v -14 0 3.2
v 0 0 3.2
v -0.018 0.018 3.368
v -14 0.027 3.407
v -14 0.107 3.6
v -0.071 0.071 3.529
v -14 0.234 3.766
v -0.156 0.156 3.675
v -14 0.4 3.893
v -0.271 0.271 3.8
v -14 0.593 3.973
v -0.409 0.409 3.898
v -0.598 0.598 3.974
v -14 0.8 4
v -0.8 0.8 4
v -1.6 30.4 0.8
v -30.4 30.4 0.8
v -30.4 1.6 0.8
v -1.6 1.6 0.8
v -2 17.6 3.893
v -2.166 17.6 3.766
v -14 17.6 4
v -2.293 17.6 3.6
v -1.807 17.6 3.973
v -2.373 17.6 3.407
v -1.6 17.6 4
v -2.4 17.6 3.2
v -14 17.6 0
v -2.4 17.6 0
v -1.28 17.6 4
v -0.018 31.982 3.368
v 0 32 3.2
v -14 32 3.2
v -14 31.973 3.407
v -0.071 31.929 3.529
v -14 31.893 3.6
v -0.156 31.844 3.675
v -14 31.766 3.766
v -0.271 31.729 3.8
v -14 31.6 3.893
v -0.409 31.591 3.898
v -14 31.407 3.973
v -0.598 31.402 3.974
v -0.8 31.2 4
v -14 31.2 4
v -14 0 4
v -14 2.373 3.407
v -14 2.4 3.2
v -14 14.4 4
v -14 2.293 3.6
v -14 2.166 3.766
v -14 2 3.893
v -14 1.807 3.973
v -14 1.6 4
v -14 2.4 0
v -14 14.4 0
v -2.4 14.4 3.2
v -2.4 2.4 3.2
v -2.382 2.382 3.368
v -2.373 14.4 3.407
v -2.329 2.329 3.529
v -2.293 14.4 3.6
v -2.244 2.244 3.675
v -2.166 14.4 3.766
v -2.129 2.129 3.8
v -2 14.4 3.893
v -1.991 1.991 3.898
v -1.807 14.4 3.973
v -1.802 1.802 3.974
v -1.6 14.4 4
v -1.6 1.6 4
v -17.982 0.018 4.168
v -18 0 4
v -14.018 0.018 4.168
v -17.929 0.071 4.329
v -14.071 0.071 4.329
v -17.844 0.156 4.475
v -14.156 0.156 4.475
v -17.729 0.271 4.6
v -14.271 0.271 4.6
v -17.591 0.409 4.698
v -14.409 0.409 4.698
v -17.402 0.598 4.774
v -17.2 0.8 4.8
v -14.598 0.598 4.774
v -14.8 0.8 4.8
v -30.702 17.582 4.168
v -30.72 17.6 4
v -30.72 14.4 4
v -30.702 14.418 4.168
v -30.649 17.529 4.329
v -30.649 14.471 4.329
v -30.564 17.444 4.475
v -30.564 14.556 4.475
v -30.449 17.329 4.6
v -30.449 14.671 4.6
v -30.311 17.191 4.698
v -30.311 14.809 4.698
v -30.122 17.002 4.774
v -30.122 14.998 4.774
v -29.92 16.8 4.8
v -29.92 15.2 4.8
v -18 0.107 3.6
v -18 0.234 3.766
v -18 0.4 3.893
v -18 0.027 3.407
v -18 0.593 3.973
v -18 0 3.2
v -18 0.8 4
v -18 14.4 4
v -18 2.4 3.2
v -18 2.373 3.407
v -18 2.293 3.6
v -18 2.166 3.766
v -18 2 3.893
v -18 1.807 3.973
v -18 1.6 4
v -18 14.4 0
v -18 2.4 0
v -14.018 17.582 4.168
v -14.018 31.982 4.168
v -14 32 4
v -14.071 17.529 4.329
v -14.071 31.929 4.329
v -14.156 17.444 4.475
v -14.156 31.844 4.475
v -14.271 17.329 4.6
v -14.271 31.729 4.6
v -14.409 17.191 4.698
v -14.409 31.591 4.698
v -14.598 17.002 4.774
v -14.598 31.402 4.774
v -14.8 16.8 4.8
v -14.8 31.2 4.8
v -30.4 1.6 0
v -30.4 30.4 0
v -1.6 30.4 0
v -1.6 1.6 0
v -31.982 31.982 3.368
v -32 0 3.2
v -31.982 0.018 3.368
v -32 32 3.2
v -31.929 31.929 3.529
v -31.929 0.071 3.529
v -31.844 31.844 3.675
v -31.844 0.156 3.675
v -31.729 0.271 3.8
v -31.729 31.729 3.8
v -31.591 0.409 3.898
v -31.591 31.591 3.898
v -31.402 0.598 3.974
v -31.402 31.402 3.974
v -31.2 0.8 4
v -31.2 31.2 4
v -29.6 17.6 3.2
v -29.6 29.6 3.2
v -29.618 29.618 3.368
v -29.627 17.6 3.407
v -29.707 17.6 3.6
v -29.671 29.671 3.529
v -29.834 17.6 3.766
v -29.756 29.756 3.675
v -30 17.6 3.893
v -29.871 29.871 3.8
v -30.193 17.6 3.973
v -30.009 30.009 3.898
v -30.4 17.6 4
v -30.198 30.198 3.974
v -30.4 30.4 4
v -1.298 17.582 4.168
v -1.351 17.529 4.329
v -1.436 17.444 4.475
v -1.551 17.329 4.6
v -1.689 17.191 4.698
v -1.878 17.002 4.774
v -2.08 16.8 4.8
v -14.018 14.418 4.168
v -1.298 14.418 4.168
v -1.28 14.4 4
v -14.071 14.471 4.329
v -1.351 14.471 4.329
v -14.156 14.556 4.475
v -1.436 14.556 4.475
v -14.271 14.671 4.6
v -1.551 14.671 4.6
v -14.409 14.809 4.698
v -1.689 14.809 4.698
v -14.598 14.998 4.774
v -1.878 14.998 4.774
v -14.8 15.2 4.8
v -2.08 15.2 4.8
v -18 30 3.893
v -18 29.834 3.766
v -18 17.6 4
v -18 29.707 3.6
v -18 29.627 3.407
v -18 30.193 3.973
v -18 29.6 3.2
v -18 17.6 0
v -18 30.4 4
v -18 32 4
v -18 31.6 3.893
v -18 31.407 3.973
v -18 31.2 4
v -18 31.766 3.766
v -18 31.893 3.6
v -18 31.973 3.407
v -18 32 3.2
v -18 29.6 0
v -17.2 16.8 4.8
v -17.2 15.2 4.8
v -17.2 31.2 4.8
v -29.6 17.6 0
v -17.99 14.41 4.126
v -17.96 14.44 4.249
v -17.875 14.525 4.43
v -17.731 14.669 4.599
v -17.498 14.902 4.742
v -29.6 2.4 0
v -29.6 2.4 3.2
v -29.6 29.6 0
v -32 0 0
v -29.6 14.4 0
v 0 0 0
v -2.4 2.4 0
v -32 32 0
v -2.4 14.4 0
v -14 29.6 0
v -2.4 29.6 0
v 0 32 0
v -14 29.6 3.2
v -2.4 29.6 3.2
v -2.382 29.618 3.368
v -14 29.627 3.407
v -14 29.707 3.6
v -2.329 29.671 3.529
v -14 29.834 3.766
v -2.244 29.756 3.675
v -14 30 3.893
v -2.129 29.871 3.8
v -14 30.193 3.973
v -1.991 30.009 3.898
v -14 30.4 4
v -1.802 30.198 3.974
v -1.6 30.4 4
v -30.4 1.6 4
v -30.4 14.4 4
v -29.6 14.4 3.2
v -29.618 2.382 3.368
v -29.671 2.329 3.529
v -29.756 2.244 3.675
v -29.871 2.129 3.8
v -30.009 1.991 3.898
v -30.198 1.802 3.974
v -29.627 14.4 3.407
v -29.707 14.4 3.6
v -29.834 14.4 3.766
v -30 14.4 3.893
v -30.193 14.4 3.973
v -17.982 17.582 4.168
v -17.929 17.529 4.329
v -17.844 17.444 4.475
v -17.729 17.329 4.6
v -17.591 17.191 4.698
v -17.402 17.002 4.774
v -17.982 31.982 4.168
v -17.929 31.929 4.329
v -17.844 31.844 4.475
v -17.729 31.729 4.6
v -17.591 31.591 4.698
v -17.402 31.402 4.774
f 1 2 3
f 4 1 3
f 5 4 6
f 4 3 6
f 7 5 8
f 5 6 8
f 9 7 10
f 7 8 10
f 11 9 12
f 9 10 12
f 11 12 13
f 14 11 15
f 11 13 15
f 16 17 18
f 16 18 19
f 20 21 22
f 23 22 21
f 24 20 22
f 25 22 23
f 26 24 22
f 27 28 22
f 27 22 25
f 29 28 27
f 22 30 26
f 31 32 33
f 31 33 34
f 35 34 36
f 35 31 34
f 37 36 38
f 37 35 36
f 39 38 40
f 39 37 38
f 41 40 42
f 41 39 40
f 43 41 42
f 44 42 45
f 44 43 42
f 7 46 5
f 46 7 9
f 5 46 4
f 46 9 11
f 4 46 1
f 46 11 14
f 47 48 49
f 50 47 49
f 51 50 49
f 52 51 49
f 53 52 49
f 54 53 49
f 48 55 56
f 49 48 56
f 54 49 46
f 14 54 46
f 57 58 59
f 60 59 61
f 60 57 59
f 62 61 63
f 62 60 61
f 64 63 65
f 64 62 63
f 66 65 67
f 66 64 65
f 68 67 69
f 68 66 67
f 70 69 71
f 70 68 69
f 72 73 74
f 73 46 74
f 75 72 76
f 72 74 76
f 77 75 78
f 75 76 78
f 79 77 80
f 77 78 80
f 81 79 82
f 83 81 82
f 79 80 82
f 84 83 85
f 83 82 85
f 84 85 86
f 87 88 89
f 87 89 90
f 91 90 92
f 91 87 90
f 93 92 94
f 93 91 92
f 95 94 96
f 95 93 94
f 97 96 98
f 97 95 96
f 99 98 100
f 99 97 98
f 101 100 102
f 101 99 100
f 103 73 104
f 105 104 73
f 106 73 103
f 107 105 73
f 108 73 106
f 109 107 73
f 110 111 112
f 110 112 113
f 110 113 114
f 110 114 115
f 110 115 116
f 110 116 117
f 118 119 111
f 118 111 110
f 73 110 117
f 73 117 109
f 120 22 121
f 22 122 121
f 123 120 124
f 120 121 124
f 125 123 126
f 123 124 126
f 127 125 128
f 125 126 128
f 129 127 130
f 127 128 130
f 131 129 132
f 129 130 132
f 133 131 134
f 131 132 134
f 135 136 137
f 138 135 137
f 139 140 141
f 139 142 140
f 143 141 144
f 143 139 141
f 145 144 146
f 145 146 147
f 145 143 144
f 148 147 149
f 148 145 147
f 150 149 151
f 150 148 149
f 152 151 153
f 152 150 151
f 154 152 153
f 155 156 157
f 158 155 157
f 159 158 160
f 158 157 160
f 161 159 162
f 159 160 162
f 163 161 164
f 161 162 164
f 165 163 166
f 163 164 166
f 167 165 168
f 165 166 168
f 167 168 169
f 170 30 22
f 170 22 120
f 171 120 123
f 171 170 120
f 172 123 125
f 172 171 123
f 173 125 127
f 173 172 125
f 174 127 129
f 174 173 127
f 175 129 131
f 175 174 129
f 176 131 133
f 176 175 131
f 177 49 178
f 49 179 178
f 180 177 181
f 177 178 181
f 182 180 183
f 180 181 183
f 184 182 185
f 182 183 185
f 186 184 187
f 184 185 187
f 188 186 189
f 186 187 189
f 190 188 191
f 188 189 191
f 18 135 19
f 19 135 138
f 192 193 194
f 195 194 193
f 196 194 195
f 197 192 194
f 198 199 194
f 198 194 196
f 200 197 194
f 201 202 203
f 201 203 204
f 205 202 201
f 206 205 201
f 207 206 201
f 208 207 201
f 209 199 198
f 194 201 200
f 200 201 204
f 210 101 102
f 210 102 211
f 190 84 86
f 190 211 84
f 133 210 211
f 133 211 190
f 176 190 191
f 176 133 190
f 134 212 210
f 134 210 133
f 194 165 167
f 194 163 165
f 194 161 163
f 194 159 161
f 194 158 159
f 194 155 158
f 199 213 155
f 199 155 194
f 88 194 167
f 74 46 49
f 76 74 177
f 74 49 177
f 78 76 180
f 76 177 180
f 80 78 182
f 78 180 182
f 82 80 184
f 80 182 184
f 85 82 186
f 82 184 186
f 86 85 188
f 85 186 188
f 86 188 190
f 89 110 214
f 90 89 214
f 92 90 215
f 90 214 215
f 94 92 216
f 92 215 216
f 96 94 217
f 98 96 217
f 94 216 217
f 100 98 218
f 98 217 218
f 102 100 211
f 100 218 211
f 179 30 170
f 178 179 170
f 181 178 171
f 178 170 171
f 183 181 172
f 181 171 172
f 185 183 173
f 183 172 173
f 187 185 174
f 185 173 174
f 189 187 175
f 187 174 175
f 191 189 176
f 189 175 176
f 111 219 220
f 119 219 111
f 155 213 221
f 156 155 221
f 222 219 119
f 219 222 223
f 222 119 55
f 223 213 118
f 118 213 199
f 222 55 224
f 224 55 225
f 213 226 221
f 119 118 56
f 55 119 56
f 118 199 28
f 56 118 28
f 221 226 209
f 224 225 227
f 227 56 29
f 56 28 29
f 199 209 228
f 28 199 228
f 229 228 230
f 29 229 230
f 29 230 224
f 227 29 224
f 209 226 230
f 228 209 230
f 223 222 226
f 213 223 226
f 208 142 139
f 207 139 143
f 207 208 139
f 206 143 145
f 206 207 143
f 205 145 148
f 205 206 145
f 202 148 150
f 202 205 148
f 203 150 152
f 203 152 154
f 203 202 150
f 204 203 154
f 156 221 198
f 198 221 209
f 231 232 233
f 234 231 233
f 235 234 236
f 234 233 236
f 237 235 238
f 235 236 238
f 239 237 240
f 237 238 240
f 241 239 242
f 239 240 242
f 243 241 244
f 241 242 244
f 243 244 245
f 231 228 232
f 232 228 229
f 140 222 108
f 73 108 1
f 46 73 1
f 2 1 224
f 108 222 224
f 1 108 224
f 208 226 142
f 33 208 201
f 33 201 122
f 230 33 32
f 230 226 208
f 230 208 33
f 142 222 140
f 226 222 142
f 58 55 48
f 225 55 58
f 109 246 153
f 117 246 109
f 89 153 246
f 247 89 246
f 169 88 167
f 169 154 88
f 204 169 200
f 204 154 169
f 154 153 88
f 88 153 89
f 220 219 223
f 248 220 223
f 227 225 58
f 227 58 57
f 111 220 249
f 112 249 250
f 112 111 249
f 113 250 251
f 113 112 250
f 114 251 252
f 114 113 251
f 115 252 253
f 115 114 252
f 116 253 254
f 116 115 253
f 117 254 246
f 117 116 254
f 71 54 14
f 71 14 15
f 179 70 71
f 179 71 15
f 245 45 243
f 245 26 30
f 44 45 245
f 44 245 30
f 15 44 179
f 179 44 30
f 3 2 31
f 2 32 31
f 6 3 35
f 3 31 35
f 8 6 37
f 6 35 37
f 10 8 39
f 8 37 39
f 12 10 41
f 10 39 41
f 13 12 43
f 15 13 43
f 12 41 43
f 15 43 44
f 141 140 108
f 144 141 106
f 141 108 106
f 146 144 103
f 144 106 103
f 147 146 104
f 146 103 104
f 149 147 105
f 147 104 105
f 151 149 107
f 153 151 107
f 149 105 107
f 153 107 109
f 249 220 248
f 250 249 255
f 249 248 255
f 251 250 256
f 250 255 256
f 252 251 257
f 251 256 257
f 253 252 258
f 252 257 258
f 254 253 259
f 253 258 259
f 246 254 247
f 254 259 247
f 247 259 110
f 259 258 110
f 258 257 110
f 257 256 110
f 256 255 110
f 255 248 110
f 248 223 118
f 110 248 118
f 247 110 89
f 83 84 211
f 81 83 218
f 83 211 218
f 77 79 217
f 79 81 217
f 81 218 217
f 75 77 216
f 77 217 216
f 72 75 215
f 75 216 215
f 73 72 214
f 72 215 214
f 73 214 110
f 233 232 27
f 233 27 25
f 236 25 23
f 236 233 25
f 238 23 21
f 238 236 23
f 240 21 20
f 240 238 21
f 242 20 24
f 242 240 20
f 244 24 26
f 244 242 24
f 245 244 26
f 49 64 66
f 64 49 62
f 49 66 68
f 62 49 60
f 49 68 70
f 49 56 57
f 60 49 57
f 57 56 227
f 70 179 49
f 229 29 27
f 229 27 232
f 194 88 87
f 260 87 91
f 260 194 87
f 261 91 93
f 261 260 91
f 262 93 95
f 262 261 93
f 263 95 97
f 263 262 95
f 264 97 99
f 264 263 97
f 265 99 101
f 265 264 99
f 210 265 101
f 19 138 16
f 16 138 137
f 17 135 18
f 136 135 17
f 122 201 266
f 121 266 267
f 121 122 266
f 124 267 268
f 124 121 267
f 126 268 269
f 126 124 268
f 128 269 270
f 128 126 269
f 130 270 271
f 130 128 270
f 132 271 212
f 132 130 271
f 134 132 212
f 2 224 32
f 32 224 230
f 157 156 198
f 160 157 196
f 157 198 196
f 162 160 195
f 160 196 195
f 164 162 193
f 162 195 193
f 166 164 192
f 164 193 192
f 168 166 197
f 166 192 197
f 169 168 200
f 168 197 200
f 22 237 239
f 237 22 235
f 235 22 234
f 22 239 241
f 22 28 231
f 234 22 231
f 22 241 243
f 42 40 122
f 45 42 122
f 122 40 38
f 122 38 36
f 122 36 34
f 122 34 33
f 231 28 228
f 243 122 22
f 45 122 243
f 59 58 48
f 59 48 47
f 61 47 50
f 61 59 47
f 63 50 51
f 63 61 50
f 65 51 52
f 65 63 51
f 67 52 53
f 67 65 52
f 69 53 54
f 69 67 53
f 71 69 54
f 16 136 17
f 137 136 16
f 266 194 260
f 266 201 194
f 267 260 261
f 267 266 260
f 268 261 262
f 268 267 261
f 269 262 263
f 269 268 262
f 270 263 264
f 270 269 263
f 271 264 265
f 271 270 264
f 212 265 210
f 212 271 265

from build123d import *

# Parameters (mm, degrees)
SKETCH1_W           = 400
SKETCH1_H           = 400
SKETCH1_W_2         = 340
SKETCH1_H_2         = 340
BOSS_EXTRUDE1_DEPTH = 50
FILLET1_R           = 10
SKETCH2_W           = 50
SKETCH2_H           = 400
SKETCH2_W_2         = 368
SKETCH2_H_2         = 40
BOSS_EXTRUDE2_DEPTH = 60
FILLET2_R           = 10
SKETCH4_W           = 360
SKETCH4_H           = 360
BOSS_EXTRUDE3_DEPTH = 10
SCALE1_SCALE        = 0.25
SCALE2_SCALE        = 0.32


with BuildPart() as part:
    # Sketch1 → Boss-Extrude1 (new body)
    with BuildSketch(Plane.XY):
        with Locations((-200, 200)):
            Rectangle(SKETCH1_W, SKETCH1_H)
        with Locations((-200, 200)):
            Rectangle(SKETCH1_W_2, SKETCH1_H_2, mode=Mode.SUBTRACT)
    extrude(amount=BOSS_EXTRUDE1_DEPTH)

    # Fillet1
    fillet1_edges = [part.edges().sort_by_distance(p)[0] for p in [
        (-400, 200, 50),
        (-200, 0, 50),
        (-200, 30, 50),
        (-30, 200, 50),
        (-200, 370, 50),
        (-370, 200, 50),
        (0, 200, 50),
        (-200, 400, 50),
    ]]
    fillet(fillet1_edges, radius=FILLET1_R)

    # Sketch2 → Boss-Extrude2 (add)
    with BuildSketch(Plane.XY):
        with Locations((-200, 200)):
            Rectangle(SKETCH2_W, SKETCH2_H)
        with Locations((-200, 200)):
            Rectangle(SKETCH2_W_2, SKETCH2_H_2)
    extrude(amount=BOSS_EXTRUDE2_DEPTH)

    # Fillet2
    fillet2_edges = [part.edges().sort_by_distance(p)[0] for p in [
        (-200, 0, 60),
        (-225, 90, 60),
        (-304.5, 180, 60),
        (-384, 200, 60),
        (-304.5, 220, 60),
        (-225, 310, 60),
        (-200, 400, 60),
        (-175, 310, 60),
        (-95.5, 220, 60),
        (-16, 200, 60),
        (-95.5, 180, 60),
        (-175, 90, 60),
    ]]
    fillet(fillet2_edges, radius=FILLET2_R - 0.0001)  # a hair under: the kernel refuses the full size


with BuildPart() as body_2:
    # Sketch4 → Boss-Extrude3 (new body)
    with BuildSketch(Plane.XY):
        with Locations((-200, 200)):
            Rectangle(SKETCH4_W, SKETCH4_H)
    extrude(amount=BOSS_EXTRUDE3_DEPTH)


with BuildPart() as part_1:
    # Scale1: scaled about (0, 0, 0)
    add(part.part.scale(SCALE1_SCALE))


with BuildPart() as body_2_1:
    # Scale1: scaled about (0, 0, 0)
    add(body_2.part.scale(SCALE1_SCALE))


with BuildPart() as body_2_2:
    # Scale2: scaled about (0, 0, 0)
    add(body_2_1.part.scale(SCALE2_SCALE))


with BuildPart() as part_2:
    # Scale2: scaled about (0, 0, 0)
    add(part_1.part.scale(SCALE2_SCALE))


solid = Compound([body_2_2.part, part_2.part])
